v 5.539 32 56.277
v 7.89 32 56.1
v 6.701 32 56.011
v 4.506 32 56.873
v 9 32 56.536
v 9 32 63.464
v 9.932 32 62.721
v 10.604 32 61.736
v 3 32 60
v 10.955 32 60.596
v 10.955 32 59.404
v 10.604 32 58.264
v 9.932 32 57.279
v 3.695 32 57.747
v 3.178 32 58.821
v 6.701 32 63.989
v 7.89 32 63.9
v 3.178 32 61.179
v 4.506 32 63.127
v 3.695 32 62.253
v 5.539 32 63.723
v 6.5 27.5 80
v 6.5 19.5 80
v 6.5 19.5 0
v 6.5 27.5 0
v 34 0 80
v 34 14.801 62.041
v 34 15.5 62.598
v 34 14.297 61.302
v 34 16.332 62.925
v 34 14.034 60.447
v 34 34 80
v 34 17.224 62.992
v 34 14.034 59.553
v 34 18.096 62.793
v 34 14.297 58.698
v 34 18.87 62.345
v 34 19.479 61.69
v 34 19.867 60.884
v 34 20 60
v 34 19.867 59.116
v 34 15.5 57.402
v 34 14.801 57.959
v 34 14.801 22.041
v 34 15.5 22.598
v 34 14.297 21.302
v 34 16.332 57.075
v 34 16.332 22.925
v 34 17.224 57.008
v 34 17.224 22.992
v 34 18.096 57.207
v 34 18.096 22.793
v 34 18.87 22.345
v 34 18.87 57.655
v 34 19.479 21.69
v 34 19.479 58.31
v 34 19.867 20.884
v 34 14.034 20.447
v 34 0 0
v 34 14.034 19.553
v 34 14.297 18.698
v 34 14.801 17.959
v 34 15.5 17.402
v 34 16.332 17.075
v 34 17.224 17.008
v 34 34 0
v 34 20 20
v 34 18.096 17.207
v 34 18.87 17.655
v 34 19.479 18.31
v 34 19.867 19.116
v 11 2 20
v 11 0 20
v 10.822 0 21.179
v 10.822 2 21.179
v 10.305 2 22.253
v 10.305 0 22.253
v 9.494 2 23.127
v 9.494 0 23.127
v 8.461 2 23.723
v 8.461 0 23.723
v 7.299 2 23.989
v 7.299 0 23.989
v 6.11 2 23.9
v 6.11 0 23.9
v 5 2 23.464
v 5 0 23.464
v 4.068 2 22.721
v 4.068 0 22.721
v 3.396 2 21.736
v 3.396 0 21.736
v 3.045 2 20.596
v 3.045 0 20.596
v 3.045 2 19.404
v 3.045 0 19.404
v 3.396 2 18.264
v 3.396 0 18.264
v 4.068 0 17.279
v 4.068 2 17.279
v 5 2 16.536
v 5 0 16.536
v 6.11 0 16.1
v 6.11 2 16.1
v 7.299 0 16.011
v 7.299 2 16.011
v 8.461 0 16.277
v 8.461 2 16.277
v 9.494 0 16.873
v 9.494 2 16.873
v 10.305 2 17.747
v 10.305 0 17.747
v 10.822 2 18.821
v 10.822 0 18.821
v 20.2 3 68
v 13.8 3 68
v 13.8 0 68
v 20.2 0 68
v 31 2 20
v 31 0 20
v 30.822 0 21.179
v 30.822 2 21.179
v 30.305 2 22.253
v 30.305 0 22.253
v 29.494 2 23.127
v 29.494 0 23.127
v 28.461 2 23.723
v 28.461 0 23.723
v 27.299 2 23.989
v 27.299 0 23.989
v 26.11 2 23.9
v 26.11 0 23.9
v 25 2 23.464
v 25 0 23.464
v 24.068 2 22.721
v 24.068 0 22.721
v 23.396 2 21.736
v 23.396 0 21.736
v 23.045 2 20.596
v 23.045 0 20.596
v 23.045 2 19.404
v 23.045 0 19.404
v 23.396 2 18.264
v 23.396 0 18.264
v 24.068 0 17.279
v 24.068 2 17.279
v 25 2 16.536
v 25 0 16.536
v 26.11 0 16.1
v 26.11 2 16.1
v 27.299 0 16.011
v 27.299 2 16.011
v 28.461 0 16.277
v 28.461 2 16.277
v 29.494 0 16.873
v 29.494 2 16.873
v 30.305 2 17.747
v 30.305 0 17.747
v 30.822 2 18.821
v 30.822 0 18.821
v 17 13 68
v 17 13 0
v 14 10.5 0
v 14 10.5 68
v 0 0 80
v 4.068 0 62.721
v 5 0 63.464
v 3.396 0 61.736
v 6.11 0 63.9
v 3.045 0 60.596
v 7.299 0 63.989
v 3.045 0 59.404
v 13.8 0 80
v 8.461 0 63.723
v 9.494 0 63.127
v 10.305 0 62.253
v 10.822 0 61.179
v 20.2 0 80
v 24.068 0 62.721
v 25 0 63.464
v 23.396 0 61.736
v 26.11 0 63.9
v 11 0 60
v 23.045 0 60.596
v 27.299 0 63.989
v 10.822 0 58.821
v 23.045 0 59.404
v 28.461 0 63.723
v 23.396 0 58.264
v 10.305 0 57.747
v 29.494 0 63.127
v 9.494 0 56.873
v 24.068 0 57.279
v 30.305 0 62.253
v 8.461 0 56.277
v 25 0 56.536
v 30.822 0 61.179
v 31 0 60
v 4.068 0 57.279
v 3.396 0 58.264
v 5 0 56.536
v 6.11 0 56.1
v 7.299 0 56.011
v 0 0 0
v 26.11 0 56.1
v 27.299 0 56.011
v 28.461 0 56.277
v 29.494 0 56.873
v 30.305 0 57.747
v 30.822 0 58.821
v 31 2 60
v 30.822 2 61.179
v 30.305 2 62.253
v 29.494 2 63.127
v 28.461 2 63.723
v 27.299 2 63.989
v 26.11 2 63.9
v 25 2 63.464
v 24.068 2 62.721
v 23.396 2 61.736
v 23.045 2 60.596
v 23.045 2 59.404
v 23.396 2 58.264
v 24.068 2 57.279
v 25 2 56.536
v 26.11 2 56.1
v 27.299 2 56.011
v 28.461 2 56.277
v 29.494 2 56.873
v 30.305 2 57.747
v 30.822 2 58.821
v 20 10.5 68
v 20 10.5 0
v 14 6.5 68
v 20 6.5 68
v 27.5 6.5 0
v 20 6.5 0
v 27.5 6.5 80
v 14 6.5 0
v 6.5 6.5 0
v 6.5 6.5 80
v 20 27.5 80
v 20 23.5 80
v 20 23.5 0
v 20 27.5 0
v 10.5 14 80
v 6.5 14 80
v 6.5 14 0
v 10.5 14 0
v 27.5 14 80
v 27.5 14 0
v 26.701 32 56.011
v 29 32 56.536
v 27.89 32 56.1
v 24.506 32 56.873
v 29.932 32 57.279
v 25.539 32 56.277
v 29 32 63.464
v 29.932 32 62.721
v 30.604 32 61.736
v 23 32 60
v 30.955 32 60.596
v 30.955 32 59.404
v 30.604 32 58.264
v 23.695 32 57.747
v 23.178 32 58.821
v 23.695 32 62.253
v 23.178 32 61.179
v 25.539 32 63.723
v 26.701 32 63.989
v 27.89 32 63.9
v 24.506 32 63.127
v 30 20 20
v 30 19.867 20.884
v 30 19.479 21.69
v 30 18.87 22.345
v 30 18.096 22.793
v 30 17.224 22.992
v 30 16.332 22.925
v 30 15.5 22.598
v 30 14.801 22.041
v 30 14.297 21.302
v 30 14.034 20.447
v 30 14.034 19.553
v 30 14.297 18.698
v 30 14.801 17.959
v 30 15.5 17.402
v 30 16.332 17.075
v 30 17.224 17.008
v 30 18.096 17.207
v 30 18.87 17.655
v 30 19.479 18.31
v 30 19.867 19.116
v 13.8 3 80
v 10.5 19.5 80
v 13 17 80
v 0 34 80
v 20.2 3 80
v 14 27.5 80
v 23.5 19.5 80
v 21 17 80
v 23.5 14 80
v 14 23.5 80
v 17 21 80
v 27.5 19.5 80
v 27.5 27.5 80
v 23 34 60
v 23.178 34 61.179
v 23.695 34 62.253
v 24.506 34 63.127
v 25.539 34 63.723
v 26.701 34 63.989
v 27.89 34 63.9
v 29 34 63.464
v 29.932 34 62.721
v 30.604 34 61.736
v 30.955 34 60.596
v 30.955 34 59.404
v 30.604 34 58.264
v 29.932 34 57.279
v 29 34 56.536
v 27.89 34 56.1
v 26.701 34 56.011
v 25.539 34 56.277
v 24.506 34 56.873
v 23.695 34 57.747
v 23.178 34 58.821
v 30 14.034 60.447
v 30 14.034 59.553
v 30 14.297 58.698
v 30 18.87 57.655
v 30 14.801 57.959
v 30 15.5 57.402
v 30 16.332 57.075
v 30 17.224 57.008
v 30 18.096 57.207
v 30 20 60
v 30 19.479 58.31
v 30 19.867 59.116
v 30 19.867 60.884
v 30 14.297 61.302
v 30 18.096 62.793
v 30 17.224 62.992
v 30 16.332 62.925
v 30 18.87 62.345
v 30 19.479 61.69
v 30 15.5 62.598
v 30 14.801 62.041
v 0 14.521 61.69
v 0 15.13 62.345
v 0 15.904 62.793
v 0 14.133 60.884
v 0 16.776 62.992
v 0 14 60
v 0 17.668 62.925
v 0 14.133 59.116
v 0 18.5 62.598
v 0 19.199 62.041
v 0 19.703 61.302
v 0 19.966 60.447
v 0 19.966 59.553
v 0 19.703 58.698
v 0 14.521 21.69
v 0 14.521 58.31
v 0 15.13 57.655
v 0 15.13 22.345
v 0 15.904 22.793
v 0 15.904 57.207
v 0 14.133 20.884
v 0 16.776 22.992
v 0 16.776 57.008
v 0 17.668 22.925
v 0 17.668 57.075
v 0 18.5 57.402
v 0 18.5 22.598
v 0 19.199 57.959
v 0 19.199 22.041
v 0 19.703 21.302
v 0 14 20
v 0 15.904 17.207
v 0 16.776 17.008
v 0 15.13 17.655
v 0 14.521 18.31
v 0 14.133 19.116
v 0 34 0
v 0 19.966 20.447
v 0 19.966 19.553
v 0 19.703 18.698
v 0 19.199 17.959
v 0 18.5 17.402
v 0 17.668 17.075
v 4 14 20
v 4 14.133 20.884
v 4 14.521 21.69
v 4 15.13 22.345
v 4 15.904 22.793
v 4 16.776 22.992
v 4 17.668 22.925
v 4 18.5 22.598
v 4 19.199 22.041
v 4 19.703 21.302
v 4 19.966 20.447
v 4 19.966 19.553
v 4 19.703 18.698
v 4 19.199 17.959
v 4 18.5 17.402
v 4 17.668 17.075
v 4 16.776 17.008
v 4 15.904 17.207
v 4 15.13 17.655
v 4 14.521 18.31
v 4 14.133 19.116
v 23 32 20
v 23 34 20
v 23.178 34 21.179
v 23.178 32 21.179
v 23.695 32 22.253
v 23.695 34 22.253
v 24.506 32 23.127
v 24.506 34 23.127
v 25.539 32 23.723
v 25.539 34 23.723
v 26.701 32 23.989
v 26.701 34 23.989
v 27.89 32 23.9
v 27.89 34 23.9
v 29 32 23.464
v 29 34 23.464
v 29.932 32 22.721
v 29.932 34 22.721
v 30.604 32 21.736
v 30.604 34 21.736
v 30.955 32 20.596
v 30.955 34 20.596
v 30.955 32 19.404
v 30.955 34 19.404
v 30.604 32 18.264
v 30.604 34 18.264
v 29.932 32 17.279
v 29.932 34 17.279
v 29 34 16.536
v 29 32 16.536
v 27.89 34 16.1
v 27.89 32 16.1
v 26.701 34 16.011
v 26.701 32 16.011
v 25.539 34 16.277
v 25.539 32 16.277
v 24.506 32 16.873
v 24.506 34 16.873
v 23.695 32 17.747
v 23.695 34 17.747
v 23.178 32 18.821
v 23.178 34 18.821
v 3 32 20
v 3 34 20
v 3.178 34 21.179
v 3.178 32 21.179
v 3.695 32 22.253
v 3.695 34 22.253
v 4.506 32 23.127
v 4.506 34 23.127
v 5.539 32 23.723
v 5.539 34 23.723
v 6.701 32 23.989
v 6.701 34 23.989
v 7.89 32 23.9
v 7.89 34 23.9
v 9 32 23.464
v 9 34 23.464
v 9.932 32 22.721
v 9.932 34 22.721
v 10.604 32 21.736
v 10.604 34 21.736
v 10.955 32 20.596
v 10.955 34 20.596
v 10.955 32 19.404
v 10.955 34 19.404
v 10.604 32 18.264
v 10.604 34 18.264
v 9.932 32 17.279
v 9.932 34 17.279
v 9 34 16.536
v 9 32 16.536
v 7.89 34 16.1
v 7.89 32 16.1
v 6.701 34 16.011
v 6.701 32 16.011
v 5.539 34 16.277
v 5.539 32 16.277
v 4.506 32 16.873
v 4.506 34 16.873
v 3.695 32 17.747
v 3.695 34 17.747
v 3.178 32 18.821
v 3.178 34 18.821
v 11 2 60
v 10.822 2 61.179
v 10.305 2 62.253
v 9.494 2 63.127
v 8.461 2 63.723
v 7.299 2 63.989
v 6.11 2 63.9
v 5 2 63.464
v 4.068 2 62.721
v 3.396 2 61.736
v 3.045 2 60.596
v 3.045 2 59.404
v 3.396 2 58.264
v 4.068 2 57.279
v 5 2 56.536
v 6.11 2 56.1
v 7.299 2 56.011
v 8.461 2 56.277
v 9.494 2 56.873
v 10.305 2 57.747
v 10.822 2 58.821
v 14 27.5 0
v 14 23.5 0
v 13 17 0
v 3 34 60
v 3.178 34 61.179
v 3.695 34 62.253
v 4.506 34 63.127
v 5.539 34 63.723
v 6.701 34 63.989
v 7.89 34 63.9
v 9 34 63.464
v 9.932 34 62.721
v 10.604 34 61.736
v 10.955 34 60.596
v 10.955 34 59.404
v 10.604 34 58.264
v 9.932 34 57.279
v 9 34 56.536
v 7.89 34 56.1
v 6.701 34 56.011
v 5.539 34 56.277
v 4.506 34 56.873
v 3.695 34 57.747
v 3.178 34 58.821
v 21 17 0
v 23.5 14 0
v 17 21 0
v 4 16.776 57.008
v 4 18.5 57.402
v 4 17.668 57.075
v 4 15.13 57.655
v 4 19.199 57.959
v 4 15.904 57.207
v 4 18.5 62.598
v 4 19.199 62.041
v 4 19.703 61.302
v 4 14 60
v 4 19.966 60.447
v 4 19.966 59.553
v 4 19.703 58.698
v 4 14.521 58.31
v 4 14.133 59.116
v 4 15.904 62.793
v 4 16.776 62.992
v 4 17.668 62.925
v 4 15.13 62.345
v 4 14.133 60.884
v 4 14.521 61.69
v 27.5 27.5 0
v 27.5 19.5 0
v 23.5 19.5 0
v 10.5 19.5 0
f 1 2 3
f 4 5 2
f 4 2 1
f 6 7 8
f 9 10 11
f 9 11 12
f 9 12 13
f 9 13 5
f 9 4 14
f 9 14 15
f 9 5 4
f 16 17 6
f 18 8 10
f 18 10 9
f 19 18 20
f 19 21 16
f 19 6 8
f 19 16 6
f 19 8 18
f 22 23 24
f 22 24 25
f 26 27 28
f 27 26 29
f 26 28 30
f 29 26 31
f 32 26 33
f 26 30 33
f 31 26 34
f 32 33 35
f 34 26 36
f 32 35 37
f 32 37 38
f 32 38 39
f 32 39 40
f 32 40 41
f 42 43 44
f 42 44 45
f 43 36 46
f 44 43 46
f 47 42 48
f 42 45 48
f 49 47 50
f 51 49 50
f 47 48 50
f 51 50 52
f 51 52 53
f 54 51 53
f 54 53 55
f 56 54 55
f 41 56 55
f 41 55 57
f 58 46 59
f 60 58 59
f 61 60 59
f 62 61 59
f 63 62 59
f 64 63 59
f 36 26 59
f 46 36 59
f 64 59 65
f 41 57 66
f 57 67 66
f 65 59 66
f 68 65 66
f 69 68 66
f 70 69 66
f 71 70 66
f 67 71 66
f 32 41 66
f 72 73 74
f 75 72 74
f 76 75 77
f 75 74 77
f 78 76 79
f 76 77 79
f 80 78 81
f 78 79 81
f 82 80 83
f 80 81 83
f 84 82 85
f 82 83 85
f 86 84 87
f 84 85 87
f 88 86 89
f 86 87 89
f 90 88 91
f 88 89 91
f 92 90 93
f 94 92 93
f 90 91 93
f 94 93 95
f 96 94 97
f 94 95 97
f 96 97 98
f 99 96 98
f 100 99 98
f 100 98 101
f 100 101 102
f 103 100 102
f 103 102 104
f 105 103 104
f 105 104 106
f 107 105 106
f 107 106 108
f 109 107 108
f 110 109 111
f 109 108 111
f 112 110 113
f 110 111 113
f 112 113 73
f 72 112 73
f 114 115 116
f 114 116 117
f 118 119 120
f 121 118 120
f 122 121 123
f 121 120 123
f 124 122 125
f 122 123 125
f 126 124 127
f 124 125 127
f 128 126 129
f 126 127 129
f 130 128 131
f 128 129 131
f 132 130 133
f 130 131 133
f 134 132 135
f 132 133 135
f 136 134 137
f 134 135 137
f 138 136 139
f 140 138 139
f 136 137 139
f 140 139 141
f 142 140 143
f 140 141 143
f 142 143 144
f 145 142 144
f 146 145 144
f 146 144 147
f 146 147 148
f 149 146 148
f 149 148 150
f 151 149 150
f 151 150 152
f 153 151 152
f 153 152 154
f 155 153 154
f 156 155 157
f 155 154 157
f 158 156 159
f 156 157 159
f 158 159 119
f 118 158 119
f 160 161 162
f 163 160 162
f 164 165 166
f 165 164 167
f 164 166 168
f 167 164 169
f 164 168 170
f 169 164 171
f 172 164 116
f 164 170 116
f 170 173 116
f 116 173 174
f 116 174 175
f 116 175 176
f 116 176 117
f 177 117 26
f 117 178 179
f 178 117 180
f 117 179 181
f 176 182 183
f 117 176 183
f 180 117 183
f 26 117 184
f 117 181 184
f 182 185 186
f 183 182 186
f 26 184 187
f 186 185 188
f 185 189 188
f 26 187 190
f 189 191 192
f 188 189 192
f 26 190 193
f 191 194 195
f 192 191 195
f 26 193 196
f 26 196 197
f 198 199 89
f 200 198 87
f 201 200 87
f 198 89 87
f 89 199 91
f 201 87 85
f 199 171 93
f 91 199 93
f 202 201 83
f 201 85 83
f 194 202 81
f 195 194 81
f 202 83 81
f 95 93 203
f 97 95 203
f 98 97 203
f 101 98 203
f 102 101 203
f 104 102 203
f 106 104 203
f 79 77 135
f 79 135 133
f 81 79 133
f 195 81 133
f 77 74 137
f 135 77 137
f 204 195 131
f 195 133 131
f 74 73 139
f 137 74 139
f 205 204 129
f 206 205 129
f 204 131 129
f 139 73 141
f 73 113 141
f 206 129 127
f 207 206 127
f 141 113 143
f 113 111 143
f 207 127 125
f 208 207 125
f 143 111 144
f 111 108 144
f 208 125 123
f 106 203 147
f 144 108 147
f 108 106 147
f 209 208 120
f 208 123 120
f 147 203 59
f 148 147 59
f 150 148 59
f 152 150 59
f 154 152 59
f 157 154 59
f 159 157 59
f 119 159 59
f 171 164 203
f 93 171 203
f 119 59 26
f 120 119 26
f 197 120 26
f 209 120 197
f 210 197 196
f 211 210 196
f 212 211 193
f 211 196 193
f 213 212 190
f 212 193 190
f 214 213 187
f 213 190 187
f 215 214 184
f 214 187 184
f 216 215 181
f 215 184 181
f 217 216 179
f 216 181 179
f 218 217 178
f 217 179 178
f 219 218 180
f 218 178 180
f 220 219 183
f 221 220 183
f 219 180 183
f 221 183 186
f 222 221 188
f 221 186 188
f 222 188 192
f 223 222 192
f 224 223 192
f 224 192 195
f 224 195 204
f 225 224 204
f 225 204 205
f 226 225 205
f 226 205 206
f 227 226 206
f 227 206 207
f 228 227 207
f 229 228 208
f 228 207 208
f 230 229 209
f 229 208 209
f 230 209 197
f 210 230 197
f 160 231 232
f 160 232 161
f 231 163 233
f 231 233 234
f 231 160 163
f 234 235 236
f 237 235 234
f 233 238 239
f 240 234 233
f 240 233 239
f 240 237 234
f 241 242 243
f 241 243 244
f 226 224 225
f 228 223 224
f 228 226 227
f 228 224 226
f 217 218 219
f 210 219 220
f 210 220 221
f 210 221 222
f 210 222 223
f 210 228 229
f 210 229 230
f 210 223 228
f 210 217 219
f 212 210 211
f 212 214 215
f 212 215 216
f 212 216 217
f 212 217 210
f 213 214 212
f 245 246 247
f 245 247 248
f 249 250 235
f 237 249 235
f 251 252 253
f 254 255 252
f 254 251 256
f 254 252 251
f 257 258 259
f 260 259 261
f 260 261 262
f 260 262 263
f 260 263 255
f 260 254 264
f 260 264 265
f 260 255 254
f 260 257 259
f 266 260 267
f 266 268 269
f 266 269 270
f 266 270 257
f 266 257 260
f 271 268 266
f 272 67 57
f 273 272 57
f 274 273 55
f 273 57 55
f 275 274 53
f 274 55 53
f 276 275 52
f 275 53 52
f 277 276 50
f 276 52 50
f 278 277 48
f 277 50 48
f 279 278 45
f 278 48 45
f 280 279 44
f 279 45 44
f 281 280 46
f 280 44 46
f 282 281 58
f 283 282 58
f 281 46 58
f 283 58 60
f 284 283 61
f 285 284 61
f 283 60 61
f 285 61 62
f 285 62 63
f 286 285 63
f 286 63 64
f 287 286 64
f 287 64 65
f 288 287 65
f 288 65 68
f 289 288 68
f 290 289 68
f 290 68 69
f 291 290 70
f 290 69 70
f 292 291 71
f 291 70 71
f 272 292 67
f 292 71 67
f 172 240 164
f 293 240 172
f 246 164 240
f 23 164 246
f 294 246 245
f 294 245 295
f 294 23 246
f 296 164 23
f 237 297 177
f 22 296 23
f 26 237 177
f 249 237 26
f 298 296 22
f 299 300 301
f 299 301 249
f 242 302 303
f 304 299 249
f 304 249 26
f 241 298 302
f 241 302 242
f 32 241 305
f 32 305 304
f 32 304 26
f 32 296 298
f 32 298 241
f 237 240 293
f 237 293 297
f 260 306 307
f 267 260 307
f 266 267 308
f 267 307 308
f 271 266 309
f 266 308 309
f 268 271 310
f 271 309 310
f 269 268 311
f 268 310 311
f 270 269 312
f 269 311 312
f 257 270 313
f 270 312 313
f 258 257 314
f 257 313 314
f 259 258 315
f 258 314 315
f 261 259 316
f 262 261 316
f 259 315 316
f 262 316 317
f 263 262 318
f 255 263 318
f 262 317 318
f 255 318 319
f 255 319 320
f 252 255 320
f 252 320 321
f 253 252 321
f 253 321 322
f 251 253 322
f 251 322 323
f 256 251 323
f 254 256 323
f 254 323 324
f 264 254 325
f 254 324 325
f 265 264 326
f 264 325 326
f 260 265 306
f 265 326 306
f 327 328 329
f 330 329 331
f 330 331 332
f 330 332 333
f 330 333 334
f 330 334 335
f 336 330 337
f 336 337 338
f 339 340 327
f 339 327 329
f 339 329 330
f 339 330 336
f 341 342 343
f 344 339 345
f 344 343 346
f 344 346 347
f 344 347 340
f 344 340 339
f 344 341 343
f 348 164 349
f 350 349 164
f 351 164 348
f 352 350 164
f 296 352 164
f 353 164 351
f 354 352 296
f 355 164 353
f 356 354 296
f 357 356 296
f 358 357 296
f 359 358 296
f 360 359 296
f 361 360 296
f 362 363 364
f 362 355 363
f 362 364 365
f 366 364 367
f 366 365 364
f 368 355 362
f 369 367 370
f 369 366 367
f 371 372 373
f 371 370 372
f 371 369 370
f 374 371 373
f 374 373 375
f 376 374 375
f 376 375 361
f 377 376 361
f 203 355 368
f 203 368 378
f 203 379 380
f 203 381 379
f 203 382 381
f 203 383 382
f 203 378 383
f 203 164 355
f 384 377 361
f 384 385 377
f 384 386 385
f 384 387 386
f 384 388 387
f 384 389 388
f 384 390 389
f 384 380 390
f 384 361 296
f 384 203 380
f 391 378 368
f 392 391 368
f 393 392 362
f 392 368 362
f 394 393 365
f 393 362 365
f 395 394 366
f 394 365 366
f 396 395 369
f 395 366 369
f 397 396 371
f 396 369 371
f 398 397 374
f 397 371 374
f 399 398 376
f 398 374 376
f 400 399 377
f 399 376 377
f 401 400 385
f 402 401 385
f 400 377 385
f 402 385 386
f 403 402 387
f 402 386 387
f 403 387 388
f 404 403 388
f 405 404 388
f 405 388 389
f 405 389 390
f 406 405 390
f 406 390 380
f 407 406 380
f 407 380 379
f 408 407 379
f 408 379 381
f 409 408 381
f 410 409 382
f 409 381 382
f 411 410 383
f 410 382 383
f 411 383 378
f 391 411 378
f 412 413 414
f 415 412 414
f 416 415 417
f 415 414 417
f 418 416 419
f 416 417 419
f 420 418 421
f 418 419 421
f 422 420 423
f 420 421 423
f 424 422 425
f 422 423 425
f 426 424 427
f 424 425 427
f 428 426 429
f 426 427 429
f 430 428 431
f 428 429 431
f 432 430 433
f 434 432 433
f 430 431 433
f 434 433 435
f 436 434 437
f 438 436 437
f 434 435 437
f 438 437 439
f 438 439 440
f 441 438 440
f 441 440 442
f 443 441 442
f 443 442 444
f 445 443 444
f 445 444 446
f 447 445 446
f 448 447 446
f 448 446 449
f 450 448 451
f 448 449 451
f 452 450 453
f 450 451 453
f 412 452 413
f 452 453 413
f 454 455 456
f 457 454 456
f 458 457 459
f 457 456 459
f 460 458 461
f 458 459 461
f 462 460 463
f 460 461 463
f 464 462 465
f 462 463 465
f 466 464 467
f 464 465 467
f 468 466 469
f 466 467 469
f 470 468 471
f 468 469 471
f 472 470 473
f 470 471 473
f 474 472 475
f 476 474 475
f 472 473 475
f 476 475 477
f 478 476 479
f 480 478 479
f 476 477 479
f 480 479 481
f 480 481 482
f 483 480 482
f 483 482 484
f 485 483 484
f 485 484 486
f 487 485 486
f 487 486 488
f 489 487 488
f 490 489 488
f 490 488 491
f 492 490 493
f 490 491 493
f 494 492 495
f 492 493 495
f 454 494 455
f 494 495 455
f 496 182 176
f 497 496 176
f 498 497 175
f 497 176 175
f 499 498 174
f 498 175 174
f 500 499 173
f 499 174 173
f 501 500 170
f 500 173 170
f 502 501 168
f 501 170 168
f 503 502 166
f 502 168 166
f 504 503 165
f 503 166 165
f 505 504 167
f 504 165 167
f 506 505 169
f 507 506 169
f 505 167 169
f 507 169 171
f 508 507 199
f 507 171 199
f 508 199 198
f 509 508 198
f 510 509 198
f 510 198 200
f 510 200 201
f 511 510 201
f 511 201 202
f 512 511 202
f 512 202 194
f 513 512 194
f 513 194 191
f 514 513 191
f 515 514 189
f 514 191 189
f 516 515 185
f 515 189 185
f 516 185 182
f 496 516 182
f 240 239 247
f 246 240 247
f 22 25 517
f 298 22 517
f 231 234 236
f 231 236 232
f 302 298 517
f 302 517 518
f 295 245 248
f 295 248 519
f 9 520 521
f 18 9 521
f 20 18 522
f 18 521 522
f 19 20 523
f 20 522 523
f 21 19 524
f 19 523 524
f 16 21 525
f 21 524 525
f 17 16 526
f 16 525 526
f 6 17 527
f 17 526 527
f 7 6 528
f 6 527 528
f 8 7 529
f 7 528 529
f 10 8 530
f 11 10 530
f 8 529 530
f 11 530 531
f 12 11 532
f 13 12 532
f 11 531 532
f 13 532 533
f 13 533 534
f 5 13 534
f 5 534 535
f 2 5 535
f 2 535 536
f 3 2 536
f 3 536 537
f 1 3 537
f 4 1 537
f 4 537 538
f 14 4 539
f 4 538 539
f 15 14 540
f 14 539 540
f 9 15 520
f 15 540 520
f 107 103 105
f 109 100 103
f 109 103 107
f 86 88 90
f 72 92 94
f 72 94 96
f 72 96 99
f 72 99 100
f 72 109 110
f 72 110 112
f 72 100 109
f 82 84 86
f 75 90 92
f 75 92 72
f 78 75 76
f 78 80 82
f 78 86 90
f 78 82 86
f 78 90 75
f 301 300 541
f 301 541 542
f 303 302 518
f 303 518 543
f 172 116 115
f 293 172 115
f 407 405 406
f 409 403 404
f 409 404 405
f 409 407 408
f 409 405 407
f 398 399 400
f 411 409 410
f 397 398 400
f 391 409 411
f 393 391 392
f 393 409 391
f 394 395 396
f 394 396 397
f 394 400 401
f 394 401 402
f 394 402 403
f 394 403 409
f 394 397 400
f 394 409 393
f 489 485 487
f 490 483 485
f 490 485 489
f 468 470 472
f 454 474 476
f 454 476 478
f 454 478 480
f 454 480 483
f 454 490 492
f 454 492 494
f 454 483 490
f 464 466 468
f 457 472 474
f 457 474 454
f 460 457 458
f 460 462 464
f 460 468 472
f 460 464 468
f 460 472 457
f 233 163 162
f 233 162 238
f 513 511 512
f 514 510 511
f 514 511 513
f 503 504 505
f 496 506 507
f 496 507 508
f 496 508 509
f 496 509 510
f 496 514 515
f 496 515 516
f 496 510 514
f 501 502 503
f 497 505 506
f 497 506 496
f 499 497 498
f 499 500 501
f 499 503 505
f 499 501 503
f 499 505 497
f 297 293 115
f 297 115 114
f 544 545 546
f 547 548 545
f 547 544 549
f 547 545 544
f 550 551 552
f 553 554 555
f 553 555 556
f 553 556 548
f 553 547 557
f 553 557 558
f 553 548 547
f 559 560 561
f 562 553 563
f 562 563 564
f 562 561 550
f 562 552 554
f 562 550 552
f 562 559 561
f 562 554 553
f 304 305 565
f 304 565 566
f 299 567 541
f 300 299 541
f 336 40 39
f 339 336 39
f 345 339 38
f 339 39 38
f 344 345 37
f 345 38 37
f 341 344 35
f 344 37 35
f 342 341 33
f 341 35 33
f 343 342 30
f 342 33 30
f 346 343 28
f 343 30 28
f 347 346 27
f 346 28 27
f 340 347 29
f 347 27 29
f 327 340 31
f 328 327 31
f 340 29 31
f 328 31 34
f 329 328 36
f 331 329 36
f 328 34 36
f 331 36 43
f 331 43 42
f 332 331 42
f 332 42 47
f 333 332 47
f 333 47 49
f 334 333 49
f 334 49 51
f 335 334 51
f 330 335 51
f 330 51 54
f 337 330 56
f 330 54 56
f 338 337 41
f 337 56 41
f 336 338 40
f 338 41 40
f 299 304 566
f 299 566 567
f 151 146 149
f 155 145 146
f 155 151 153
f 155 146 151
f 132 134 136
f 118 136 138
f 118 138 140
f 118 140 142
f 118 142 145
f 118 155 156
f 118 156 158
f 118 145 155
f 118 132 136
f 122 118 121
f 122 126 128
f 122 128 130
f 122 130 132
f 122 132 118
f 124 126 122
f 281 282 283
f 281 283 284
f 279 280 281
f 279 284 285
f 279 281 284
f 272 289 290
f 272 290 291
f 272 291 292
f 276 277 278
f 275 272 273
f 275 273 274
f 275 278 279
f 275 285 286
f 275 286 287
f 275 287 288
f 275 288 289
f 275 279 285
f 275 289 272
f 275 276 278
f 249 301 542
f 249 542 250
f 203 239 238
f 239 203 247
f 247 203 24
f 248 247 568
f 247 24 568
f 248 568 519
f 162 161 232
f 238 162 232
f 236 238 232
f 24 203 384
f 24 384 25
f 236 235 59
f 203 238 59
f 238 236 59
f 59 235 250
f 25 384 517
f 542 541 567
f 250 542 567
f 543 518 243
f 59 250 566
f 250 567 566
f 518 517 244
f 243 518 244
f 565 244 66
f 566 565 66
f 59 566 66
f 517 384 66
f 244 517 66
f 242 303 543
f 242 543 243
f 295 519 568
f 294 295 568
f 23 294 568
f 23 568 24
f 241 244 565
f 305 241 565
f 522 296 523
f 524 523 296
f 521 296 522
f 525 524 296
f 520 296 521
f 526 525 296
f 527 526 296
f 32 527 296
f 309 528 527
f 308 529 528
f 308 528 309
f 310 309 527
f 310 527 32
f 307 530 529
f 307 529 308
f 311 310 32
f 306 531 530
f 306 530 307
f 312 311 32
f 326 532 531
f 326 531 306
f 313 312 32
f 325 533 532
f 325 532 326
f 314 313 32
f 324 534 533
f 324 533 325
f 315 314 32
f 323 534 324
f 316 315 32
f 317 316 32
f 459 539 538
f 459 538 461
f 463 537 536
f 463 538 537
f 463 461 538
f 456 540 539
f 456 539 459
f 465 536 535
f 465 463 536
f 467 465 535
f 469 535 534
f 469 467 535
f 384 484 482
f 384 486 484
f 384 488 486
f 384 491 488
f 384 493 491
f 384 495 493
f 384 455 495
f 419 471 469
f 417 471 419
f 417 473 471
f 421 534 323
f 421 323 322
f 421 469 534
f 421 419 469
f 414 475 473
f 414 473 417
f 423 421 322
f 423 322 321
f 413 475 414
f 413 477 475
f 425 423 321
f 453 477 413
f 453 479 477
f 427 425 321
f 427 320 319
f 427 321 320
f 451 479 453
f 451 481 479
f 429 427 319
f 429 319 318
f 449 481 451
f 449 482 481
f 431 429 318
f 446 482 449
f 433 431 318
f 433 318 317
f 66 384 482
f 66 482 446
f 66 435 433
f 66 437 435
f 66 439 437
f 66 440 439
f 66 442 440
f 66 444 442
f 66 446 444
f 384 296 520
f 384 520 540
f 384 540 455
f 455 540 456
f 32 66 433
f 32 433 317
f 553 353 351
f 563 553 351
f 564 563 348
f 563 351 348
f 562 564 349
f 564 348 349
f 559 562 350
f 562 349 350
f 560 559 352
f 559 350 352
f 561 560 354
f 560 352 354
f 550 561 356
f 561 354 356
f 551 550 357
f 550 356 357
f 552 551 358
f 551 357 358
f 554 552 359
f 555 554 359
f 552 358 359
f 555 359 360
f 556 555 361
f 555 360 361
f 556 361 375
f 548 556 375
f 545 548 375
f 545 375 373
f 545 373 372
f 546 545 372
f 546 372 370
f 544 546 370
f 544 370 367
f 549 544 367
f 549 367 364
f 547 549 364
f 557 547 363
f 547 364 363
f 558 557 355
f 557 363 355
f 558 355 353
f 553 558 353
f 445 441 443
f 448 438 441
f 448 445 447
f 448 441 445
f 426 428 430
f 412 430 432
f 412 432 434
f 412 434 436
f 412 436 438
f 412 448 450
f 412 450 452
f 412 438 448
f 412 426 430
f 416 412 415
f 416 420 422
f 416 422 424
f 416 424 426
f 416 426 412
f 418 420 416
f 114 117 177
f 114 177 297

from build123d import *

# Parameters (mm, degrees)
SKETCH_W        = 34
SKETCH_H        = 34
PAD_DEPTH       = 80
POCKET_DEPTH    = 80
SKETCH002_R     = 3
POCKET001_DEPTH = 4
SKETCH003_R     = 3
POCKET002_DEPTH = 4
SKETCH004_R     = 4
POCKET003_DEPTH = 2
SKETCH005_R     = 4
POCKET004_DEPTH = 2
SKETCH006_W     = 6.4
SKETCH006_H     = 3
SKETCH006_W_2   = 8
SKETCH006_H_2   = 8
POCKET005_DEPTH = 12


with BuildPart() as part:
    # Sketch → Pad (new body)
    with BuildSketch(Plane.XY):
        with Locations((17, 17)):
            Rectangle(SKETCH_W, SKETCH_H)
    extrude(amount=PAD_DEPTH)

    # Sketch001 (on Face6 of Pad) → Pocket (cut)
    with BuildSketch(Plane.XY.offset(80)):
        Polygon((6.5, 27.5), (14, 27.5), (14, 23.5), (17, 21), (20, 23.5), (20, 27.5), (27.5, 27.5), (27.5, 19.5), (23.5, 19.5), (21, 17), (23.5, 14), (27.5, 14), (27.5, 6.5), (20, 6.5), (20, 10.5), (17, 13), (14, 10.5), (14, 6.5), (6.5, 6.5), (6.5, 14), (10.5, 14), (13, 17), (10.5, 19.5), (6.5, 19.5), align=None)
    extrude(amount=-POCKET_DEPTH, mode=Mode.SUBTRACT)

    # Sketch002 (on Face2 of Pocket) → Pocket001 (cut)
    with BuildSketch(Plane(origin=(0, 0, 0), x_dir=(0, -1, 0), z_dir=(-1, 0, 0))):
        with Locations((-17, 60)):
            Circle(SKETCH002_R)
        with Locations((-17, 20)):
            Circle(SKETCH002_R)
    extrude(amount=-POCKET001_DEPTH, mode=Mode.SUBTRACT)

    # Sketch003 (on Face3 of Pocket001) → Pocket002 (cut)
    with BuildSketch(Plane.YZ.offset(34)):
        with Locations((17, 60)):
            Circle(SKETCH003_R)
        with Locations((17, 20)):
            Circle(SKETCH003_R)
    extrude(amount=-POCKET002_DEPTH, mode=Mode.SUBTRACT)

    # Sketch004 (on Face1 of Pocket002) → Pocket003 (cut)
    with BuildSketch(Plane(origin=(0, 34, 0), x_dir=(-1, 0, 0), z_dir=(0, 1, 0))):
        with Locations((-27, 60)):
            Circle(SKETCH004_R)
        with Locations((-7, 60)):
            Circle(SKETCH004_R)
        with Locations((-27, 20)):
            Circle(SKETCH004_R)
        with Locations((-7, 20)):
            Circle(SKETCH004_R)
    extrude(amount=-POCKET003_DEPTH, mode=Mode.SUBTRACT)

    # Sketch005 (on Face10 of Pocket003) → Pocket004 (cut)
    with BuildSketch(Plane.XZ):
        with Locations((7, 60)):
            Circle(SKETCH005_R)
        with Locations((27, 60)):
            Circle(SKETCH005_R)
        with Locations((7, 20)):
            Circle(SKETCH005_R)
        with Locations((27, 20)):
            Circle(SKETCH005_R)
    extrude(amount=-POCKET004_DEPTH, mode=Mode.SUBTRACT)

    # Sketch006 (on Face4 of Pocket004) → Pocket005 (cut)
    with BuildSketch(Plane.XY.offset(80)):
        with Locations((17, 1.5)):
            Rectangle(SKETCH006_W, SKETCH006_H)
        with Locations((17, 10.5)):
            Rectangle(SKETCH006_W_2, SKETCH006_H_2)
    extrude(amount=-POCKET005_DEPTH, mode=Mode.SUBTRACT)


solid = part.part
